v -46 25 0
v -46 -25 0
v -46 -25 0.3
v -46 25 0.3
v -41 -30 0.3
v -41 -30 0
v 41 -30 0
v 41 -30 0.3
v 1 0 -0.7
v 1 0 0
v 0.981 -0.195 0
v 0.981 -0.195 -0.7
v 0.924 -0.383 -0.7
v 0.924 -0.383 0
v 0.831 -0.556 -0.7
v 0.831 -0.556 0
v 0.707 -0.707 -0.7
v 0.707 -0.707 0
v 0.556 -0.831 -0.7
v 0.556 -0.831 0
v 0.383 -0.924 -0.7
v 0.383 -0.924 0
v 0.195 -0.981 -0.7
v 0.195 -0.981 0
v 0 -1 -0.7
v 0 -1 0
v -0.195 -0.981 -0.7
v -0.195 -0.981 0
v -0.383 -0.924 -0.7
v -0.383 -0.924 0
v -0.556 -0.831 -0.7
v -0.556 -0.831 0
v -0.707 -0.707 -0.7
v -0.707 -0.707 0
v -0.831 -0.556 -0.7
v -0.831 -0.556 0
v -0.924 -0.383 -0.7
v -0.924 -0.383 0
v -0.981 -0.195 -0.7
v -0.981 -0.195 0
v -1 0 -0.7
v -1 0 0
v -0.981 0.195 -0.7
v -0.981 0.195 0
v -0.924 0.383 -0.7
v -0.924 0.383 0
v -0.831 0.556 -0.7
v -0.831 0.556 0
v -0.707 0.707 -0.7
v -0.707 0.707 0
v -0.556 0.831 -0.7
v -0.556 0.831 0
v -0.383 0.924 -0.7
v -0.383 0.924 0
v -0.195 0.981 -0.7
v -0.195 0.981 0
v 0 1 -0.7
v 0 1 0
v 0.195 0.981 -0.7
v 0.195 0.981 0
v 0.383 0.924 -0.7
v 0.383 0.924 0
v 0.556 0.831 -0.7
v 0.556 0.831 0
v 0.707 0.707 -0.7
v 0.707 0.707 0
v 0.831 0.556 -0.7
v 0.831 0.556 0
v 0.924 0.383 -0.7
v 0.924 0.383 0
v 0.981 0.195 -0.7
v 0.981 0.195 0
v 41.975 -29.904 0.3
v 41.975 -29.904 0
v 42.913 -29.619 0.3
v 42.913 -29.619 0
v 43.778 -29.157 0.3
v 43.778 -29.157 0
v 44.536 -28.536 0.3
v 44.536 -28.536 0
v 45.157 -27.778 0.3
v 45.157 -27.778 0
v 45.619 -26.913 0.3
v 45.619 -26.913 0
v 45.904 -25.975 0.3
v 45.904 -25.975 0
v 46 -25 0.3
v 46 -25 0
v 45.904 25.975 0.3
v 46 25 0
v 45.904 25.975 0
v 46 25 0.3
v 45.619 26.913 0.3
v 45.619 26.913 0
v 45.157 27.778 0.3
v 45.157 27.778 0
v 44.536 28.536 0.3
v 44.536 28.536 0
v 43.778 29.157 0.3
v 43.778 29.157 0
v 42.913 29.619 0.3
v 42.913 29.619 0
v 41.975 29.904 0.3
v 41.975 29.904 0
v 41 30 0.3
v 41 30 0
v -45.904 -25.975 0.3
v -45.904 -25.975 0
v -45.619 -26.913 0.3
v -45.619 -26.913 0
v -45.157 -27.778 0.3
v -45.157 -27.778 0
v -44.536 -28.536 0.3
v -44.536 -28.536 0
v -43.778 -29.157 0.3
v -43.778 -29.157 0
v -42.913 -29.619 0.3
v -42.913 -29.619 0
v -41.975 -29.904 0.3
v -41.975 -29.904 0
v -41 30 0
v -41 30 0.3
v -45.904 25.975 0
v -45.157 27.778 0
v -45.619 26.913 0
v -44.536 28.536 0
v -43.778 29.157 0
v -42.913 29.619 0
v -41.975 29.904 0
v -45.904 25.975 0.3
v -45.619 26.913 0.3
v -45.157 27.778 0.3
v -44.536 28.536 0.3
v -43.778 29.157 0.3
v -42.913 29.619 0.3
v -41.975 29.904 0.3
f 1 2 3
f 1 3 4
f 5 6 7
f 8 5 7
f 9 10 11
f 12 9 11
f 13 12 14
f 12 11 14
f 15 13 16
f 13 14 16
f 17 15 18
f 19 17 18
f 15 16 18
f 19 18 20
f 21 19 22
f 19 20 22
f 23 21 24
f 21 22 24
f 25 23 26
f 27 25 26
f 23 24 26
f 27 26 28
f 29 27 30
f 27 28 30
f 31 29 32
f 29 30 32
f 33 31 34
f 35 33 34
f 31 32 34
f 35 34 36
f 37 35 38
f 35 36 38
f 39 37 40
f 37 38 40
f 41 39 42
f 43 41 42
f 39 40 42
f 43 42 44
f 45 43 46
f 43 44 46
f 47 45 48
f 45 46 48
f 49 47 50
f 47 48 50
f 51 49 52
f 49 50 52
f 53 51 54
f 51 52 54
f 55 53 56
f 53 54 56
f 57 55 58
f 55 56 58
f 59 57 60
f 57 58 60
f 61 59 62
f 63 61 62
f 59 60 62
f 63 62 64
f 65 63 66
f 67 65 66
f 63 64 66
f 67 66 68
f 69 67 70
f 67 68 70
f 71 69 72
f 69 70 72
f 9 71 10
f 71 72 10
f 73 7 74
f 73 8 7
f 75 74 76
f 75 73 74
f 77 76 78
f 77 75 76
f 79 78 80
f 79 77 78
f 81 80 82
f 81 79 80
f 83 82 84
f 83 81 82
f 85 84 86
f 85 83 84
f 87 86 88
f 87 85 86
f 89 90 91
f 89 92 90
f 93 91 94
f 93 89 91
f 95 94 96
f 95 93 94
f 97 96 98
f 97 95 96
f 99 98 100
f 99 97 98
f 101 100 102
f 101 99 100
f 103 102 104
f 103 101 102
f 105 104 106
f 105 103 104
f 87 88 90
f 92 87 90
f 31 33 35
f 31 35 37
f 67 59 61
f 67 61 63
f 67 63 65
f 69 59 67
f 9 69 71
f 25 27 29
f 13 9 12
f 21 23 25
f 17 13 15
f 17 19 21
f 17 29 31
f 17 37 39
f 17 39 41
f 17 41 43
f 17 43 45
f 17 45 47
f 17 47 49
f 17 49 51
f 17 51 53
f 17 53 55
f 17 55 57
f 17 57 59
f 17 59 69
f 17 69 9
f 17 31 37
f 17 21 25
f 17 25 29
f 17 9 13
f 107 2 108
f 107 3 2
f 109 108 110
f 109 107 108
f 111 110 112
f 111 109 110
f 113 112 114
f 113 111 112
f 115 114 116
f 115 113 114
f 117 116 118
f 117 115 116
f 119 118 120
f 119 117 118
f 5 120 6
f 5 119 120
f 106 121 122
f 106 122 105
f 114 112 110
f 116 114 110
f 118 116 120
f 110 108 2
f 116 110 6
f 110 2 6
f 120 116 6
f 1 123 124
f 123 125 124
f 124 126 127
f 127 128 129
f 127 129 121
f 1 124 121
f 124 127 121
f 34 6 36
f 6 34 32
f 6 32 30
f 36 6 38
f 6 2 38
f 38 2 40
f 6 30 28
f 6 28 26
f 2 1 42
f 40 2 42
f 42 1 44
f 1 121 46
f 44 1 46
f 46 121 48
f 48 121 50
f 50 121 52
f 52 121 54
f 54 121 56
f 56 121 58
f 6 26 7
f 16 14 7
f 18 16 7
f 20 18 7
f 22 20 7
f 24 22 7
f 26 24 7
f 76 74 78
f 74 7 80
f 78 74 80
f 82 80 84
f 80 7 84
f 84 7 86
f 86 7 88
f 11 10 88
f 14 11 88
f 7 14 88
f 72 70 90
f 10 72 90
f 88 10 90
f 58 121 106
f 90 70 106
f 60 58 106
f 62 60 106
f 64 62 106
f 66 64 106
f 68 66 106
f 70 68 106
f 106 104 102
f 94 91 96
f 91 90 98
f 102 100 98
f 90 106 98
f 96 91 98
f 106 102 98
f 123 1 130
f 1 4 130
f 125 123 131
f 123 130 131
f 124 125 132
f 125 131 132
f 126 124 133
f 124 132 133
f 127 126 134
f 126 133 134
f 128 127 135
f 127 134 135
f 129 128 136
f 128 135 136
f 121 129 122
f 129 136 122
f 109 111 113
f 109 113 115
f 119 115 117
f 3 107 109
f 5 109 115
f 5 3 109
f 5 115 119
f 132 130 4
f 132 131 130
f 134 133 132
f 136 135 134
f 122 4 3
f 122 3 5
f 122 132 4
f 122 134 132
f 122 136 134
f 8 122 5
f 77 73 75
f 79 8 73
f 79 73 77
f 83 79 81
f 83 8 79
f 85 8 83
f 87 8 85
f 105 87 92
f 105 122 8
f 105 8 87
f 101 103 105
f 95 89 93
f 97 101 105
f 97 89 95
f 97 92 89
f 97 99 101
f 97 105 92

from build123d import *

# Parameters (mm, degrees)
F0_W     = 92
F0_H     = 60
F1_DEPTH = 0.3
F2_R     = 5
F3_R     = 1
F4_DEPTH = 0.7


with BuildPart() as f1:
    # F0 (on Top) → F1 (new body)
    with BuildSketch(Plane.XY):
        Rectangle(F0_W, F0_H)
    extrude(amount=F1_DEPTH)

    # F2
    f2_edges = [f1.edges().sort_by_distance(p)[0] for p in [
        (-46, 30, 0.15),
        (-46, -30, 0.15),
        (46, 30, 0.15),
        (46, -30, 0.15),
    ]]
    fillet(f2_edges, radius=F2_R)

    # F3 (on face) → F4 (join)
    with BuildSketch(Plane(origin=(0, 0, 0), x_dir=(1, 0, 0), z_dir=(0, 0, -1))):
        Circle(F3_R)
    extrude(amount=F4_DEPTH)


solid = f1.part
